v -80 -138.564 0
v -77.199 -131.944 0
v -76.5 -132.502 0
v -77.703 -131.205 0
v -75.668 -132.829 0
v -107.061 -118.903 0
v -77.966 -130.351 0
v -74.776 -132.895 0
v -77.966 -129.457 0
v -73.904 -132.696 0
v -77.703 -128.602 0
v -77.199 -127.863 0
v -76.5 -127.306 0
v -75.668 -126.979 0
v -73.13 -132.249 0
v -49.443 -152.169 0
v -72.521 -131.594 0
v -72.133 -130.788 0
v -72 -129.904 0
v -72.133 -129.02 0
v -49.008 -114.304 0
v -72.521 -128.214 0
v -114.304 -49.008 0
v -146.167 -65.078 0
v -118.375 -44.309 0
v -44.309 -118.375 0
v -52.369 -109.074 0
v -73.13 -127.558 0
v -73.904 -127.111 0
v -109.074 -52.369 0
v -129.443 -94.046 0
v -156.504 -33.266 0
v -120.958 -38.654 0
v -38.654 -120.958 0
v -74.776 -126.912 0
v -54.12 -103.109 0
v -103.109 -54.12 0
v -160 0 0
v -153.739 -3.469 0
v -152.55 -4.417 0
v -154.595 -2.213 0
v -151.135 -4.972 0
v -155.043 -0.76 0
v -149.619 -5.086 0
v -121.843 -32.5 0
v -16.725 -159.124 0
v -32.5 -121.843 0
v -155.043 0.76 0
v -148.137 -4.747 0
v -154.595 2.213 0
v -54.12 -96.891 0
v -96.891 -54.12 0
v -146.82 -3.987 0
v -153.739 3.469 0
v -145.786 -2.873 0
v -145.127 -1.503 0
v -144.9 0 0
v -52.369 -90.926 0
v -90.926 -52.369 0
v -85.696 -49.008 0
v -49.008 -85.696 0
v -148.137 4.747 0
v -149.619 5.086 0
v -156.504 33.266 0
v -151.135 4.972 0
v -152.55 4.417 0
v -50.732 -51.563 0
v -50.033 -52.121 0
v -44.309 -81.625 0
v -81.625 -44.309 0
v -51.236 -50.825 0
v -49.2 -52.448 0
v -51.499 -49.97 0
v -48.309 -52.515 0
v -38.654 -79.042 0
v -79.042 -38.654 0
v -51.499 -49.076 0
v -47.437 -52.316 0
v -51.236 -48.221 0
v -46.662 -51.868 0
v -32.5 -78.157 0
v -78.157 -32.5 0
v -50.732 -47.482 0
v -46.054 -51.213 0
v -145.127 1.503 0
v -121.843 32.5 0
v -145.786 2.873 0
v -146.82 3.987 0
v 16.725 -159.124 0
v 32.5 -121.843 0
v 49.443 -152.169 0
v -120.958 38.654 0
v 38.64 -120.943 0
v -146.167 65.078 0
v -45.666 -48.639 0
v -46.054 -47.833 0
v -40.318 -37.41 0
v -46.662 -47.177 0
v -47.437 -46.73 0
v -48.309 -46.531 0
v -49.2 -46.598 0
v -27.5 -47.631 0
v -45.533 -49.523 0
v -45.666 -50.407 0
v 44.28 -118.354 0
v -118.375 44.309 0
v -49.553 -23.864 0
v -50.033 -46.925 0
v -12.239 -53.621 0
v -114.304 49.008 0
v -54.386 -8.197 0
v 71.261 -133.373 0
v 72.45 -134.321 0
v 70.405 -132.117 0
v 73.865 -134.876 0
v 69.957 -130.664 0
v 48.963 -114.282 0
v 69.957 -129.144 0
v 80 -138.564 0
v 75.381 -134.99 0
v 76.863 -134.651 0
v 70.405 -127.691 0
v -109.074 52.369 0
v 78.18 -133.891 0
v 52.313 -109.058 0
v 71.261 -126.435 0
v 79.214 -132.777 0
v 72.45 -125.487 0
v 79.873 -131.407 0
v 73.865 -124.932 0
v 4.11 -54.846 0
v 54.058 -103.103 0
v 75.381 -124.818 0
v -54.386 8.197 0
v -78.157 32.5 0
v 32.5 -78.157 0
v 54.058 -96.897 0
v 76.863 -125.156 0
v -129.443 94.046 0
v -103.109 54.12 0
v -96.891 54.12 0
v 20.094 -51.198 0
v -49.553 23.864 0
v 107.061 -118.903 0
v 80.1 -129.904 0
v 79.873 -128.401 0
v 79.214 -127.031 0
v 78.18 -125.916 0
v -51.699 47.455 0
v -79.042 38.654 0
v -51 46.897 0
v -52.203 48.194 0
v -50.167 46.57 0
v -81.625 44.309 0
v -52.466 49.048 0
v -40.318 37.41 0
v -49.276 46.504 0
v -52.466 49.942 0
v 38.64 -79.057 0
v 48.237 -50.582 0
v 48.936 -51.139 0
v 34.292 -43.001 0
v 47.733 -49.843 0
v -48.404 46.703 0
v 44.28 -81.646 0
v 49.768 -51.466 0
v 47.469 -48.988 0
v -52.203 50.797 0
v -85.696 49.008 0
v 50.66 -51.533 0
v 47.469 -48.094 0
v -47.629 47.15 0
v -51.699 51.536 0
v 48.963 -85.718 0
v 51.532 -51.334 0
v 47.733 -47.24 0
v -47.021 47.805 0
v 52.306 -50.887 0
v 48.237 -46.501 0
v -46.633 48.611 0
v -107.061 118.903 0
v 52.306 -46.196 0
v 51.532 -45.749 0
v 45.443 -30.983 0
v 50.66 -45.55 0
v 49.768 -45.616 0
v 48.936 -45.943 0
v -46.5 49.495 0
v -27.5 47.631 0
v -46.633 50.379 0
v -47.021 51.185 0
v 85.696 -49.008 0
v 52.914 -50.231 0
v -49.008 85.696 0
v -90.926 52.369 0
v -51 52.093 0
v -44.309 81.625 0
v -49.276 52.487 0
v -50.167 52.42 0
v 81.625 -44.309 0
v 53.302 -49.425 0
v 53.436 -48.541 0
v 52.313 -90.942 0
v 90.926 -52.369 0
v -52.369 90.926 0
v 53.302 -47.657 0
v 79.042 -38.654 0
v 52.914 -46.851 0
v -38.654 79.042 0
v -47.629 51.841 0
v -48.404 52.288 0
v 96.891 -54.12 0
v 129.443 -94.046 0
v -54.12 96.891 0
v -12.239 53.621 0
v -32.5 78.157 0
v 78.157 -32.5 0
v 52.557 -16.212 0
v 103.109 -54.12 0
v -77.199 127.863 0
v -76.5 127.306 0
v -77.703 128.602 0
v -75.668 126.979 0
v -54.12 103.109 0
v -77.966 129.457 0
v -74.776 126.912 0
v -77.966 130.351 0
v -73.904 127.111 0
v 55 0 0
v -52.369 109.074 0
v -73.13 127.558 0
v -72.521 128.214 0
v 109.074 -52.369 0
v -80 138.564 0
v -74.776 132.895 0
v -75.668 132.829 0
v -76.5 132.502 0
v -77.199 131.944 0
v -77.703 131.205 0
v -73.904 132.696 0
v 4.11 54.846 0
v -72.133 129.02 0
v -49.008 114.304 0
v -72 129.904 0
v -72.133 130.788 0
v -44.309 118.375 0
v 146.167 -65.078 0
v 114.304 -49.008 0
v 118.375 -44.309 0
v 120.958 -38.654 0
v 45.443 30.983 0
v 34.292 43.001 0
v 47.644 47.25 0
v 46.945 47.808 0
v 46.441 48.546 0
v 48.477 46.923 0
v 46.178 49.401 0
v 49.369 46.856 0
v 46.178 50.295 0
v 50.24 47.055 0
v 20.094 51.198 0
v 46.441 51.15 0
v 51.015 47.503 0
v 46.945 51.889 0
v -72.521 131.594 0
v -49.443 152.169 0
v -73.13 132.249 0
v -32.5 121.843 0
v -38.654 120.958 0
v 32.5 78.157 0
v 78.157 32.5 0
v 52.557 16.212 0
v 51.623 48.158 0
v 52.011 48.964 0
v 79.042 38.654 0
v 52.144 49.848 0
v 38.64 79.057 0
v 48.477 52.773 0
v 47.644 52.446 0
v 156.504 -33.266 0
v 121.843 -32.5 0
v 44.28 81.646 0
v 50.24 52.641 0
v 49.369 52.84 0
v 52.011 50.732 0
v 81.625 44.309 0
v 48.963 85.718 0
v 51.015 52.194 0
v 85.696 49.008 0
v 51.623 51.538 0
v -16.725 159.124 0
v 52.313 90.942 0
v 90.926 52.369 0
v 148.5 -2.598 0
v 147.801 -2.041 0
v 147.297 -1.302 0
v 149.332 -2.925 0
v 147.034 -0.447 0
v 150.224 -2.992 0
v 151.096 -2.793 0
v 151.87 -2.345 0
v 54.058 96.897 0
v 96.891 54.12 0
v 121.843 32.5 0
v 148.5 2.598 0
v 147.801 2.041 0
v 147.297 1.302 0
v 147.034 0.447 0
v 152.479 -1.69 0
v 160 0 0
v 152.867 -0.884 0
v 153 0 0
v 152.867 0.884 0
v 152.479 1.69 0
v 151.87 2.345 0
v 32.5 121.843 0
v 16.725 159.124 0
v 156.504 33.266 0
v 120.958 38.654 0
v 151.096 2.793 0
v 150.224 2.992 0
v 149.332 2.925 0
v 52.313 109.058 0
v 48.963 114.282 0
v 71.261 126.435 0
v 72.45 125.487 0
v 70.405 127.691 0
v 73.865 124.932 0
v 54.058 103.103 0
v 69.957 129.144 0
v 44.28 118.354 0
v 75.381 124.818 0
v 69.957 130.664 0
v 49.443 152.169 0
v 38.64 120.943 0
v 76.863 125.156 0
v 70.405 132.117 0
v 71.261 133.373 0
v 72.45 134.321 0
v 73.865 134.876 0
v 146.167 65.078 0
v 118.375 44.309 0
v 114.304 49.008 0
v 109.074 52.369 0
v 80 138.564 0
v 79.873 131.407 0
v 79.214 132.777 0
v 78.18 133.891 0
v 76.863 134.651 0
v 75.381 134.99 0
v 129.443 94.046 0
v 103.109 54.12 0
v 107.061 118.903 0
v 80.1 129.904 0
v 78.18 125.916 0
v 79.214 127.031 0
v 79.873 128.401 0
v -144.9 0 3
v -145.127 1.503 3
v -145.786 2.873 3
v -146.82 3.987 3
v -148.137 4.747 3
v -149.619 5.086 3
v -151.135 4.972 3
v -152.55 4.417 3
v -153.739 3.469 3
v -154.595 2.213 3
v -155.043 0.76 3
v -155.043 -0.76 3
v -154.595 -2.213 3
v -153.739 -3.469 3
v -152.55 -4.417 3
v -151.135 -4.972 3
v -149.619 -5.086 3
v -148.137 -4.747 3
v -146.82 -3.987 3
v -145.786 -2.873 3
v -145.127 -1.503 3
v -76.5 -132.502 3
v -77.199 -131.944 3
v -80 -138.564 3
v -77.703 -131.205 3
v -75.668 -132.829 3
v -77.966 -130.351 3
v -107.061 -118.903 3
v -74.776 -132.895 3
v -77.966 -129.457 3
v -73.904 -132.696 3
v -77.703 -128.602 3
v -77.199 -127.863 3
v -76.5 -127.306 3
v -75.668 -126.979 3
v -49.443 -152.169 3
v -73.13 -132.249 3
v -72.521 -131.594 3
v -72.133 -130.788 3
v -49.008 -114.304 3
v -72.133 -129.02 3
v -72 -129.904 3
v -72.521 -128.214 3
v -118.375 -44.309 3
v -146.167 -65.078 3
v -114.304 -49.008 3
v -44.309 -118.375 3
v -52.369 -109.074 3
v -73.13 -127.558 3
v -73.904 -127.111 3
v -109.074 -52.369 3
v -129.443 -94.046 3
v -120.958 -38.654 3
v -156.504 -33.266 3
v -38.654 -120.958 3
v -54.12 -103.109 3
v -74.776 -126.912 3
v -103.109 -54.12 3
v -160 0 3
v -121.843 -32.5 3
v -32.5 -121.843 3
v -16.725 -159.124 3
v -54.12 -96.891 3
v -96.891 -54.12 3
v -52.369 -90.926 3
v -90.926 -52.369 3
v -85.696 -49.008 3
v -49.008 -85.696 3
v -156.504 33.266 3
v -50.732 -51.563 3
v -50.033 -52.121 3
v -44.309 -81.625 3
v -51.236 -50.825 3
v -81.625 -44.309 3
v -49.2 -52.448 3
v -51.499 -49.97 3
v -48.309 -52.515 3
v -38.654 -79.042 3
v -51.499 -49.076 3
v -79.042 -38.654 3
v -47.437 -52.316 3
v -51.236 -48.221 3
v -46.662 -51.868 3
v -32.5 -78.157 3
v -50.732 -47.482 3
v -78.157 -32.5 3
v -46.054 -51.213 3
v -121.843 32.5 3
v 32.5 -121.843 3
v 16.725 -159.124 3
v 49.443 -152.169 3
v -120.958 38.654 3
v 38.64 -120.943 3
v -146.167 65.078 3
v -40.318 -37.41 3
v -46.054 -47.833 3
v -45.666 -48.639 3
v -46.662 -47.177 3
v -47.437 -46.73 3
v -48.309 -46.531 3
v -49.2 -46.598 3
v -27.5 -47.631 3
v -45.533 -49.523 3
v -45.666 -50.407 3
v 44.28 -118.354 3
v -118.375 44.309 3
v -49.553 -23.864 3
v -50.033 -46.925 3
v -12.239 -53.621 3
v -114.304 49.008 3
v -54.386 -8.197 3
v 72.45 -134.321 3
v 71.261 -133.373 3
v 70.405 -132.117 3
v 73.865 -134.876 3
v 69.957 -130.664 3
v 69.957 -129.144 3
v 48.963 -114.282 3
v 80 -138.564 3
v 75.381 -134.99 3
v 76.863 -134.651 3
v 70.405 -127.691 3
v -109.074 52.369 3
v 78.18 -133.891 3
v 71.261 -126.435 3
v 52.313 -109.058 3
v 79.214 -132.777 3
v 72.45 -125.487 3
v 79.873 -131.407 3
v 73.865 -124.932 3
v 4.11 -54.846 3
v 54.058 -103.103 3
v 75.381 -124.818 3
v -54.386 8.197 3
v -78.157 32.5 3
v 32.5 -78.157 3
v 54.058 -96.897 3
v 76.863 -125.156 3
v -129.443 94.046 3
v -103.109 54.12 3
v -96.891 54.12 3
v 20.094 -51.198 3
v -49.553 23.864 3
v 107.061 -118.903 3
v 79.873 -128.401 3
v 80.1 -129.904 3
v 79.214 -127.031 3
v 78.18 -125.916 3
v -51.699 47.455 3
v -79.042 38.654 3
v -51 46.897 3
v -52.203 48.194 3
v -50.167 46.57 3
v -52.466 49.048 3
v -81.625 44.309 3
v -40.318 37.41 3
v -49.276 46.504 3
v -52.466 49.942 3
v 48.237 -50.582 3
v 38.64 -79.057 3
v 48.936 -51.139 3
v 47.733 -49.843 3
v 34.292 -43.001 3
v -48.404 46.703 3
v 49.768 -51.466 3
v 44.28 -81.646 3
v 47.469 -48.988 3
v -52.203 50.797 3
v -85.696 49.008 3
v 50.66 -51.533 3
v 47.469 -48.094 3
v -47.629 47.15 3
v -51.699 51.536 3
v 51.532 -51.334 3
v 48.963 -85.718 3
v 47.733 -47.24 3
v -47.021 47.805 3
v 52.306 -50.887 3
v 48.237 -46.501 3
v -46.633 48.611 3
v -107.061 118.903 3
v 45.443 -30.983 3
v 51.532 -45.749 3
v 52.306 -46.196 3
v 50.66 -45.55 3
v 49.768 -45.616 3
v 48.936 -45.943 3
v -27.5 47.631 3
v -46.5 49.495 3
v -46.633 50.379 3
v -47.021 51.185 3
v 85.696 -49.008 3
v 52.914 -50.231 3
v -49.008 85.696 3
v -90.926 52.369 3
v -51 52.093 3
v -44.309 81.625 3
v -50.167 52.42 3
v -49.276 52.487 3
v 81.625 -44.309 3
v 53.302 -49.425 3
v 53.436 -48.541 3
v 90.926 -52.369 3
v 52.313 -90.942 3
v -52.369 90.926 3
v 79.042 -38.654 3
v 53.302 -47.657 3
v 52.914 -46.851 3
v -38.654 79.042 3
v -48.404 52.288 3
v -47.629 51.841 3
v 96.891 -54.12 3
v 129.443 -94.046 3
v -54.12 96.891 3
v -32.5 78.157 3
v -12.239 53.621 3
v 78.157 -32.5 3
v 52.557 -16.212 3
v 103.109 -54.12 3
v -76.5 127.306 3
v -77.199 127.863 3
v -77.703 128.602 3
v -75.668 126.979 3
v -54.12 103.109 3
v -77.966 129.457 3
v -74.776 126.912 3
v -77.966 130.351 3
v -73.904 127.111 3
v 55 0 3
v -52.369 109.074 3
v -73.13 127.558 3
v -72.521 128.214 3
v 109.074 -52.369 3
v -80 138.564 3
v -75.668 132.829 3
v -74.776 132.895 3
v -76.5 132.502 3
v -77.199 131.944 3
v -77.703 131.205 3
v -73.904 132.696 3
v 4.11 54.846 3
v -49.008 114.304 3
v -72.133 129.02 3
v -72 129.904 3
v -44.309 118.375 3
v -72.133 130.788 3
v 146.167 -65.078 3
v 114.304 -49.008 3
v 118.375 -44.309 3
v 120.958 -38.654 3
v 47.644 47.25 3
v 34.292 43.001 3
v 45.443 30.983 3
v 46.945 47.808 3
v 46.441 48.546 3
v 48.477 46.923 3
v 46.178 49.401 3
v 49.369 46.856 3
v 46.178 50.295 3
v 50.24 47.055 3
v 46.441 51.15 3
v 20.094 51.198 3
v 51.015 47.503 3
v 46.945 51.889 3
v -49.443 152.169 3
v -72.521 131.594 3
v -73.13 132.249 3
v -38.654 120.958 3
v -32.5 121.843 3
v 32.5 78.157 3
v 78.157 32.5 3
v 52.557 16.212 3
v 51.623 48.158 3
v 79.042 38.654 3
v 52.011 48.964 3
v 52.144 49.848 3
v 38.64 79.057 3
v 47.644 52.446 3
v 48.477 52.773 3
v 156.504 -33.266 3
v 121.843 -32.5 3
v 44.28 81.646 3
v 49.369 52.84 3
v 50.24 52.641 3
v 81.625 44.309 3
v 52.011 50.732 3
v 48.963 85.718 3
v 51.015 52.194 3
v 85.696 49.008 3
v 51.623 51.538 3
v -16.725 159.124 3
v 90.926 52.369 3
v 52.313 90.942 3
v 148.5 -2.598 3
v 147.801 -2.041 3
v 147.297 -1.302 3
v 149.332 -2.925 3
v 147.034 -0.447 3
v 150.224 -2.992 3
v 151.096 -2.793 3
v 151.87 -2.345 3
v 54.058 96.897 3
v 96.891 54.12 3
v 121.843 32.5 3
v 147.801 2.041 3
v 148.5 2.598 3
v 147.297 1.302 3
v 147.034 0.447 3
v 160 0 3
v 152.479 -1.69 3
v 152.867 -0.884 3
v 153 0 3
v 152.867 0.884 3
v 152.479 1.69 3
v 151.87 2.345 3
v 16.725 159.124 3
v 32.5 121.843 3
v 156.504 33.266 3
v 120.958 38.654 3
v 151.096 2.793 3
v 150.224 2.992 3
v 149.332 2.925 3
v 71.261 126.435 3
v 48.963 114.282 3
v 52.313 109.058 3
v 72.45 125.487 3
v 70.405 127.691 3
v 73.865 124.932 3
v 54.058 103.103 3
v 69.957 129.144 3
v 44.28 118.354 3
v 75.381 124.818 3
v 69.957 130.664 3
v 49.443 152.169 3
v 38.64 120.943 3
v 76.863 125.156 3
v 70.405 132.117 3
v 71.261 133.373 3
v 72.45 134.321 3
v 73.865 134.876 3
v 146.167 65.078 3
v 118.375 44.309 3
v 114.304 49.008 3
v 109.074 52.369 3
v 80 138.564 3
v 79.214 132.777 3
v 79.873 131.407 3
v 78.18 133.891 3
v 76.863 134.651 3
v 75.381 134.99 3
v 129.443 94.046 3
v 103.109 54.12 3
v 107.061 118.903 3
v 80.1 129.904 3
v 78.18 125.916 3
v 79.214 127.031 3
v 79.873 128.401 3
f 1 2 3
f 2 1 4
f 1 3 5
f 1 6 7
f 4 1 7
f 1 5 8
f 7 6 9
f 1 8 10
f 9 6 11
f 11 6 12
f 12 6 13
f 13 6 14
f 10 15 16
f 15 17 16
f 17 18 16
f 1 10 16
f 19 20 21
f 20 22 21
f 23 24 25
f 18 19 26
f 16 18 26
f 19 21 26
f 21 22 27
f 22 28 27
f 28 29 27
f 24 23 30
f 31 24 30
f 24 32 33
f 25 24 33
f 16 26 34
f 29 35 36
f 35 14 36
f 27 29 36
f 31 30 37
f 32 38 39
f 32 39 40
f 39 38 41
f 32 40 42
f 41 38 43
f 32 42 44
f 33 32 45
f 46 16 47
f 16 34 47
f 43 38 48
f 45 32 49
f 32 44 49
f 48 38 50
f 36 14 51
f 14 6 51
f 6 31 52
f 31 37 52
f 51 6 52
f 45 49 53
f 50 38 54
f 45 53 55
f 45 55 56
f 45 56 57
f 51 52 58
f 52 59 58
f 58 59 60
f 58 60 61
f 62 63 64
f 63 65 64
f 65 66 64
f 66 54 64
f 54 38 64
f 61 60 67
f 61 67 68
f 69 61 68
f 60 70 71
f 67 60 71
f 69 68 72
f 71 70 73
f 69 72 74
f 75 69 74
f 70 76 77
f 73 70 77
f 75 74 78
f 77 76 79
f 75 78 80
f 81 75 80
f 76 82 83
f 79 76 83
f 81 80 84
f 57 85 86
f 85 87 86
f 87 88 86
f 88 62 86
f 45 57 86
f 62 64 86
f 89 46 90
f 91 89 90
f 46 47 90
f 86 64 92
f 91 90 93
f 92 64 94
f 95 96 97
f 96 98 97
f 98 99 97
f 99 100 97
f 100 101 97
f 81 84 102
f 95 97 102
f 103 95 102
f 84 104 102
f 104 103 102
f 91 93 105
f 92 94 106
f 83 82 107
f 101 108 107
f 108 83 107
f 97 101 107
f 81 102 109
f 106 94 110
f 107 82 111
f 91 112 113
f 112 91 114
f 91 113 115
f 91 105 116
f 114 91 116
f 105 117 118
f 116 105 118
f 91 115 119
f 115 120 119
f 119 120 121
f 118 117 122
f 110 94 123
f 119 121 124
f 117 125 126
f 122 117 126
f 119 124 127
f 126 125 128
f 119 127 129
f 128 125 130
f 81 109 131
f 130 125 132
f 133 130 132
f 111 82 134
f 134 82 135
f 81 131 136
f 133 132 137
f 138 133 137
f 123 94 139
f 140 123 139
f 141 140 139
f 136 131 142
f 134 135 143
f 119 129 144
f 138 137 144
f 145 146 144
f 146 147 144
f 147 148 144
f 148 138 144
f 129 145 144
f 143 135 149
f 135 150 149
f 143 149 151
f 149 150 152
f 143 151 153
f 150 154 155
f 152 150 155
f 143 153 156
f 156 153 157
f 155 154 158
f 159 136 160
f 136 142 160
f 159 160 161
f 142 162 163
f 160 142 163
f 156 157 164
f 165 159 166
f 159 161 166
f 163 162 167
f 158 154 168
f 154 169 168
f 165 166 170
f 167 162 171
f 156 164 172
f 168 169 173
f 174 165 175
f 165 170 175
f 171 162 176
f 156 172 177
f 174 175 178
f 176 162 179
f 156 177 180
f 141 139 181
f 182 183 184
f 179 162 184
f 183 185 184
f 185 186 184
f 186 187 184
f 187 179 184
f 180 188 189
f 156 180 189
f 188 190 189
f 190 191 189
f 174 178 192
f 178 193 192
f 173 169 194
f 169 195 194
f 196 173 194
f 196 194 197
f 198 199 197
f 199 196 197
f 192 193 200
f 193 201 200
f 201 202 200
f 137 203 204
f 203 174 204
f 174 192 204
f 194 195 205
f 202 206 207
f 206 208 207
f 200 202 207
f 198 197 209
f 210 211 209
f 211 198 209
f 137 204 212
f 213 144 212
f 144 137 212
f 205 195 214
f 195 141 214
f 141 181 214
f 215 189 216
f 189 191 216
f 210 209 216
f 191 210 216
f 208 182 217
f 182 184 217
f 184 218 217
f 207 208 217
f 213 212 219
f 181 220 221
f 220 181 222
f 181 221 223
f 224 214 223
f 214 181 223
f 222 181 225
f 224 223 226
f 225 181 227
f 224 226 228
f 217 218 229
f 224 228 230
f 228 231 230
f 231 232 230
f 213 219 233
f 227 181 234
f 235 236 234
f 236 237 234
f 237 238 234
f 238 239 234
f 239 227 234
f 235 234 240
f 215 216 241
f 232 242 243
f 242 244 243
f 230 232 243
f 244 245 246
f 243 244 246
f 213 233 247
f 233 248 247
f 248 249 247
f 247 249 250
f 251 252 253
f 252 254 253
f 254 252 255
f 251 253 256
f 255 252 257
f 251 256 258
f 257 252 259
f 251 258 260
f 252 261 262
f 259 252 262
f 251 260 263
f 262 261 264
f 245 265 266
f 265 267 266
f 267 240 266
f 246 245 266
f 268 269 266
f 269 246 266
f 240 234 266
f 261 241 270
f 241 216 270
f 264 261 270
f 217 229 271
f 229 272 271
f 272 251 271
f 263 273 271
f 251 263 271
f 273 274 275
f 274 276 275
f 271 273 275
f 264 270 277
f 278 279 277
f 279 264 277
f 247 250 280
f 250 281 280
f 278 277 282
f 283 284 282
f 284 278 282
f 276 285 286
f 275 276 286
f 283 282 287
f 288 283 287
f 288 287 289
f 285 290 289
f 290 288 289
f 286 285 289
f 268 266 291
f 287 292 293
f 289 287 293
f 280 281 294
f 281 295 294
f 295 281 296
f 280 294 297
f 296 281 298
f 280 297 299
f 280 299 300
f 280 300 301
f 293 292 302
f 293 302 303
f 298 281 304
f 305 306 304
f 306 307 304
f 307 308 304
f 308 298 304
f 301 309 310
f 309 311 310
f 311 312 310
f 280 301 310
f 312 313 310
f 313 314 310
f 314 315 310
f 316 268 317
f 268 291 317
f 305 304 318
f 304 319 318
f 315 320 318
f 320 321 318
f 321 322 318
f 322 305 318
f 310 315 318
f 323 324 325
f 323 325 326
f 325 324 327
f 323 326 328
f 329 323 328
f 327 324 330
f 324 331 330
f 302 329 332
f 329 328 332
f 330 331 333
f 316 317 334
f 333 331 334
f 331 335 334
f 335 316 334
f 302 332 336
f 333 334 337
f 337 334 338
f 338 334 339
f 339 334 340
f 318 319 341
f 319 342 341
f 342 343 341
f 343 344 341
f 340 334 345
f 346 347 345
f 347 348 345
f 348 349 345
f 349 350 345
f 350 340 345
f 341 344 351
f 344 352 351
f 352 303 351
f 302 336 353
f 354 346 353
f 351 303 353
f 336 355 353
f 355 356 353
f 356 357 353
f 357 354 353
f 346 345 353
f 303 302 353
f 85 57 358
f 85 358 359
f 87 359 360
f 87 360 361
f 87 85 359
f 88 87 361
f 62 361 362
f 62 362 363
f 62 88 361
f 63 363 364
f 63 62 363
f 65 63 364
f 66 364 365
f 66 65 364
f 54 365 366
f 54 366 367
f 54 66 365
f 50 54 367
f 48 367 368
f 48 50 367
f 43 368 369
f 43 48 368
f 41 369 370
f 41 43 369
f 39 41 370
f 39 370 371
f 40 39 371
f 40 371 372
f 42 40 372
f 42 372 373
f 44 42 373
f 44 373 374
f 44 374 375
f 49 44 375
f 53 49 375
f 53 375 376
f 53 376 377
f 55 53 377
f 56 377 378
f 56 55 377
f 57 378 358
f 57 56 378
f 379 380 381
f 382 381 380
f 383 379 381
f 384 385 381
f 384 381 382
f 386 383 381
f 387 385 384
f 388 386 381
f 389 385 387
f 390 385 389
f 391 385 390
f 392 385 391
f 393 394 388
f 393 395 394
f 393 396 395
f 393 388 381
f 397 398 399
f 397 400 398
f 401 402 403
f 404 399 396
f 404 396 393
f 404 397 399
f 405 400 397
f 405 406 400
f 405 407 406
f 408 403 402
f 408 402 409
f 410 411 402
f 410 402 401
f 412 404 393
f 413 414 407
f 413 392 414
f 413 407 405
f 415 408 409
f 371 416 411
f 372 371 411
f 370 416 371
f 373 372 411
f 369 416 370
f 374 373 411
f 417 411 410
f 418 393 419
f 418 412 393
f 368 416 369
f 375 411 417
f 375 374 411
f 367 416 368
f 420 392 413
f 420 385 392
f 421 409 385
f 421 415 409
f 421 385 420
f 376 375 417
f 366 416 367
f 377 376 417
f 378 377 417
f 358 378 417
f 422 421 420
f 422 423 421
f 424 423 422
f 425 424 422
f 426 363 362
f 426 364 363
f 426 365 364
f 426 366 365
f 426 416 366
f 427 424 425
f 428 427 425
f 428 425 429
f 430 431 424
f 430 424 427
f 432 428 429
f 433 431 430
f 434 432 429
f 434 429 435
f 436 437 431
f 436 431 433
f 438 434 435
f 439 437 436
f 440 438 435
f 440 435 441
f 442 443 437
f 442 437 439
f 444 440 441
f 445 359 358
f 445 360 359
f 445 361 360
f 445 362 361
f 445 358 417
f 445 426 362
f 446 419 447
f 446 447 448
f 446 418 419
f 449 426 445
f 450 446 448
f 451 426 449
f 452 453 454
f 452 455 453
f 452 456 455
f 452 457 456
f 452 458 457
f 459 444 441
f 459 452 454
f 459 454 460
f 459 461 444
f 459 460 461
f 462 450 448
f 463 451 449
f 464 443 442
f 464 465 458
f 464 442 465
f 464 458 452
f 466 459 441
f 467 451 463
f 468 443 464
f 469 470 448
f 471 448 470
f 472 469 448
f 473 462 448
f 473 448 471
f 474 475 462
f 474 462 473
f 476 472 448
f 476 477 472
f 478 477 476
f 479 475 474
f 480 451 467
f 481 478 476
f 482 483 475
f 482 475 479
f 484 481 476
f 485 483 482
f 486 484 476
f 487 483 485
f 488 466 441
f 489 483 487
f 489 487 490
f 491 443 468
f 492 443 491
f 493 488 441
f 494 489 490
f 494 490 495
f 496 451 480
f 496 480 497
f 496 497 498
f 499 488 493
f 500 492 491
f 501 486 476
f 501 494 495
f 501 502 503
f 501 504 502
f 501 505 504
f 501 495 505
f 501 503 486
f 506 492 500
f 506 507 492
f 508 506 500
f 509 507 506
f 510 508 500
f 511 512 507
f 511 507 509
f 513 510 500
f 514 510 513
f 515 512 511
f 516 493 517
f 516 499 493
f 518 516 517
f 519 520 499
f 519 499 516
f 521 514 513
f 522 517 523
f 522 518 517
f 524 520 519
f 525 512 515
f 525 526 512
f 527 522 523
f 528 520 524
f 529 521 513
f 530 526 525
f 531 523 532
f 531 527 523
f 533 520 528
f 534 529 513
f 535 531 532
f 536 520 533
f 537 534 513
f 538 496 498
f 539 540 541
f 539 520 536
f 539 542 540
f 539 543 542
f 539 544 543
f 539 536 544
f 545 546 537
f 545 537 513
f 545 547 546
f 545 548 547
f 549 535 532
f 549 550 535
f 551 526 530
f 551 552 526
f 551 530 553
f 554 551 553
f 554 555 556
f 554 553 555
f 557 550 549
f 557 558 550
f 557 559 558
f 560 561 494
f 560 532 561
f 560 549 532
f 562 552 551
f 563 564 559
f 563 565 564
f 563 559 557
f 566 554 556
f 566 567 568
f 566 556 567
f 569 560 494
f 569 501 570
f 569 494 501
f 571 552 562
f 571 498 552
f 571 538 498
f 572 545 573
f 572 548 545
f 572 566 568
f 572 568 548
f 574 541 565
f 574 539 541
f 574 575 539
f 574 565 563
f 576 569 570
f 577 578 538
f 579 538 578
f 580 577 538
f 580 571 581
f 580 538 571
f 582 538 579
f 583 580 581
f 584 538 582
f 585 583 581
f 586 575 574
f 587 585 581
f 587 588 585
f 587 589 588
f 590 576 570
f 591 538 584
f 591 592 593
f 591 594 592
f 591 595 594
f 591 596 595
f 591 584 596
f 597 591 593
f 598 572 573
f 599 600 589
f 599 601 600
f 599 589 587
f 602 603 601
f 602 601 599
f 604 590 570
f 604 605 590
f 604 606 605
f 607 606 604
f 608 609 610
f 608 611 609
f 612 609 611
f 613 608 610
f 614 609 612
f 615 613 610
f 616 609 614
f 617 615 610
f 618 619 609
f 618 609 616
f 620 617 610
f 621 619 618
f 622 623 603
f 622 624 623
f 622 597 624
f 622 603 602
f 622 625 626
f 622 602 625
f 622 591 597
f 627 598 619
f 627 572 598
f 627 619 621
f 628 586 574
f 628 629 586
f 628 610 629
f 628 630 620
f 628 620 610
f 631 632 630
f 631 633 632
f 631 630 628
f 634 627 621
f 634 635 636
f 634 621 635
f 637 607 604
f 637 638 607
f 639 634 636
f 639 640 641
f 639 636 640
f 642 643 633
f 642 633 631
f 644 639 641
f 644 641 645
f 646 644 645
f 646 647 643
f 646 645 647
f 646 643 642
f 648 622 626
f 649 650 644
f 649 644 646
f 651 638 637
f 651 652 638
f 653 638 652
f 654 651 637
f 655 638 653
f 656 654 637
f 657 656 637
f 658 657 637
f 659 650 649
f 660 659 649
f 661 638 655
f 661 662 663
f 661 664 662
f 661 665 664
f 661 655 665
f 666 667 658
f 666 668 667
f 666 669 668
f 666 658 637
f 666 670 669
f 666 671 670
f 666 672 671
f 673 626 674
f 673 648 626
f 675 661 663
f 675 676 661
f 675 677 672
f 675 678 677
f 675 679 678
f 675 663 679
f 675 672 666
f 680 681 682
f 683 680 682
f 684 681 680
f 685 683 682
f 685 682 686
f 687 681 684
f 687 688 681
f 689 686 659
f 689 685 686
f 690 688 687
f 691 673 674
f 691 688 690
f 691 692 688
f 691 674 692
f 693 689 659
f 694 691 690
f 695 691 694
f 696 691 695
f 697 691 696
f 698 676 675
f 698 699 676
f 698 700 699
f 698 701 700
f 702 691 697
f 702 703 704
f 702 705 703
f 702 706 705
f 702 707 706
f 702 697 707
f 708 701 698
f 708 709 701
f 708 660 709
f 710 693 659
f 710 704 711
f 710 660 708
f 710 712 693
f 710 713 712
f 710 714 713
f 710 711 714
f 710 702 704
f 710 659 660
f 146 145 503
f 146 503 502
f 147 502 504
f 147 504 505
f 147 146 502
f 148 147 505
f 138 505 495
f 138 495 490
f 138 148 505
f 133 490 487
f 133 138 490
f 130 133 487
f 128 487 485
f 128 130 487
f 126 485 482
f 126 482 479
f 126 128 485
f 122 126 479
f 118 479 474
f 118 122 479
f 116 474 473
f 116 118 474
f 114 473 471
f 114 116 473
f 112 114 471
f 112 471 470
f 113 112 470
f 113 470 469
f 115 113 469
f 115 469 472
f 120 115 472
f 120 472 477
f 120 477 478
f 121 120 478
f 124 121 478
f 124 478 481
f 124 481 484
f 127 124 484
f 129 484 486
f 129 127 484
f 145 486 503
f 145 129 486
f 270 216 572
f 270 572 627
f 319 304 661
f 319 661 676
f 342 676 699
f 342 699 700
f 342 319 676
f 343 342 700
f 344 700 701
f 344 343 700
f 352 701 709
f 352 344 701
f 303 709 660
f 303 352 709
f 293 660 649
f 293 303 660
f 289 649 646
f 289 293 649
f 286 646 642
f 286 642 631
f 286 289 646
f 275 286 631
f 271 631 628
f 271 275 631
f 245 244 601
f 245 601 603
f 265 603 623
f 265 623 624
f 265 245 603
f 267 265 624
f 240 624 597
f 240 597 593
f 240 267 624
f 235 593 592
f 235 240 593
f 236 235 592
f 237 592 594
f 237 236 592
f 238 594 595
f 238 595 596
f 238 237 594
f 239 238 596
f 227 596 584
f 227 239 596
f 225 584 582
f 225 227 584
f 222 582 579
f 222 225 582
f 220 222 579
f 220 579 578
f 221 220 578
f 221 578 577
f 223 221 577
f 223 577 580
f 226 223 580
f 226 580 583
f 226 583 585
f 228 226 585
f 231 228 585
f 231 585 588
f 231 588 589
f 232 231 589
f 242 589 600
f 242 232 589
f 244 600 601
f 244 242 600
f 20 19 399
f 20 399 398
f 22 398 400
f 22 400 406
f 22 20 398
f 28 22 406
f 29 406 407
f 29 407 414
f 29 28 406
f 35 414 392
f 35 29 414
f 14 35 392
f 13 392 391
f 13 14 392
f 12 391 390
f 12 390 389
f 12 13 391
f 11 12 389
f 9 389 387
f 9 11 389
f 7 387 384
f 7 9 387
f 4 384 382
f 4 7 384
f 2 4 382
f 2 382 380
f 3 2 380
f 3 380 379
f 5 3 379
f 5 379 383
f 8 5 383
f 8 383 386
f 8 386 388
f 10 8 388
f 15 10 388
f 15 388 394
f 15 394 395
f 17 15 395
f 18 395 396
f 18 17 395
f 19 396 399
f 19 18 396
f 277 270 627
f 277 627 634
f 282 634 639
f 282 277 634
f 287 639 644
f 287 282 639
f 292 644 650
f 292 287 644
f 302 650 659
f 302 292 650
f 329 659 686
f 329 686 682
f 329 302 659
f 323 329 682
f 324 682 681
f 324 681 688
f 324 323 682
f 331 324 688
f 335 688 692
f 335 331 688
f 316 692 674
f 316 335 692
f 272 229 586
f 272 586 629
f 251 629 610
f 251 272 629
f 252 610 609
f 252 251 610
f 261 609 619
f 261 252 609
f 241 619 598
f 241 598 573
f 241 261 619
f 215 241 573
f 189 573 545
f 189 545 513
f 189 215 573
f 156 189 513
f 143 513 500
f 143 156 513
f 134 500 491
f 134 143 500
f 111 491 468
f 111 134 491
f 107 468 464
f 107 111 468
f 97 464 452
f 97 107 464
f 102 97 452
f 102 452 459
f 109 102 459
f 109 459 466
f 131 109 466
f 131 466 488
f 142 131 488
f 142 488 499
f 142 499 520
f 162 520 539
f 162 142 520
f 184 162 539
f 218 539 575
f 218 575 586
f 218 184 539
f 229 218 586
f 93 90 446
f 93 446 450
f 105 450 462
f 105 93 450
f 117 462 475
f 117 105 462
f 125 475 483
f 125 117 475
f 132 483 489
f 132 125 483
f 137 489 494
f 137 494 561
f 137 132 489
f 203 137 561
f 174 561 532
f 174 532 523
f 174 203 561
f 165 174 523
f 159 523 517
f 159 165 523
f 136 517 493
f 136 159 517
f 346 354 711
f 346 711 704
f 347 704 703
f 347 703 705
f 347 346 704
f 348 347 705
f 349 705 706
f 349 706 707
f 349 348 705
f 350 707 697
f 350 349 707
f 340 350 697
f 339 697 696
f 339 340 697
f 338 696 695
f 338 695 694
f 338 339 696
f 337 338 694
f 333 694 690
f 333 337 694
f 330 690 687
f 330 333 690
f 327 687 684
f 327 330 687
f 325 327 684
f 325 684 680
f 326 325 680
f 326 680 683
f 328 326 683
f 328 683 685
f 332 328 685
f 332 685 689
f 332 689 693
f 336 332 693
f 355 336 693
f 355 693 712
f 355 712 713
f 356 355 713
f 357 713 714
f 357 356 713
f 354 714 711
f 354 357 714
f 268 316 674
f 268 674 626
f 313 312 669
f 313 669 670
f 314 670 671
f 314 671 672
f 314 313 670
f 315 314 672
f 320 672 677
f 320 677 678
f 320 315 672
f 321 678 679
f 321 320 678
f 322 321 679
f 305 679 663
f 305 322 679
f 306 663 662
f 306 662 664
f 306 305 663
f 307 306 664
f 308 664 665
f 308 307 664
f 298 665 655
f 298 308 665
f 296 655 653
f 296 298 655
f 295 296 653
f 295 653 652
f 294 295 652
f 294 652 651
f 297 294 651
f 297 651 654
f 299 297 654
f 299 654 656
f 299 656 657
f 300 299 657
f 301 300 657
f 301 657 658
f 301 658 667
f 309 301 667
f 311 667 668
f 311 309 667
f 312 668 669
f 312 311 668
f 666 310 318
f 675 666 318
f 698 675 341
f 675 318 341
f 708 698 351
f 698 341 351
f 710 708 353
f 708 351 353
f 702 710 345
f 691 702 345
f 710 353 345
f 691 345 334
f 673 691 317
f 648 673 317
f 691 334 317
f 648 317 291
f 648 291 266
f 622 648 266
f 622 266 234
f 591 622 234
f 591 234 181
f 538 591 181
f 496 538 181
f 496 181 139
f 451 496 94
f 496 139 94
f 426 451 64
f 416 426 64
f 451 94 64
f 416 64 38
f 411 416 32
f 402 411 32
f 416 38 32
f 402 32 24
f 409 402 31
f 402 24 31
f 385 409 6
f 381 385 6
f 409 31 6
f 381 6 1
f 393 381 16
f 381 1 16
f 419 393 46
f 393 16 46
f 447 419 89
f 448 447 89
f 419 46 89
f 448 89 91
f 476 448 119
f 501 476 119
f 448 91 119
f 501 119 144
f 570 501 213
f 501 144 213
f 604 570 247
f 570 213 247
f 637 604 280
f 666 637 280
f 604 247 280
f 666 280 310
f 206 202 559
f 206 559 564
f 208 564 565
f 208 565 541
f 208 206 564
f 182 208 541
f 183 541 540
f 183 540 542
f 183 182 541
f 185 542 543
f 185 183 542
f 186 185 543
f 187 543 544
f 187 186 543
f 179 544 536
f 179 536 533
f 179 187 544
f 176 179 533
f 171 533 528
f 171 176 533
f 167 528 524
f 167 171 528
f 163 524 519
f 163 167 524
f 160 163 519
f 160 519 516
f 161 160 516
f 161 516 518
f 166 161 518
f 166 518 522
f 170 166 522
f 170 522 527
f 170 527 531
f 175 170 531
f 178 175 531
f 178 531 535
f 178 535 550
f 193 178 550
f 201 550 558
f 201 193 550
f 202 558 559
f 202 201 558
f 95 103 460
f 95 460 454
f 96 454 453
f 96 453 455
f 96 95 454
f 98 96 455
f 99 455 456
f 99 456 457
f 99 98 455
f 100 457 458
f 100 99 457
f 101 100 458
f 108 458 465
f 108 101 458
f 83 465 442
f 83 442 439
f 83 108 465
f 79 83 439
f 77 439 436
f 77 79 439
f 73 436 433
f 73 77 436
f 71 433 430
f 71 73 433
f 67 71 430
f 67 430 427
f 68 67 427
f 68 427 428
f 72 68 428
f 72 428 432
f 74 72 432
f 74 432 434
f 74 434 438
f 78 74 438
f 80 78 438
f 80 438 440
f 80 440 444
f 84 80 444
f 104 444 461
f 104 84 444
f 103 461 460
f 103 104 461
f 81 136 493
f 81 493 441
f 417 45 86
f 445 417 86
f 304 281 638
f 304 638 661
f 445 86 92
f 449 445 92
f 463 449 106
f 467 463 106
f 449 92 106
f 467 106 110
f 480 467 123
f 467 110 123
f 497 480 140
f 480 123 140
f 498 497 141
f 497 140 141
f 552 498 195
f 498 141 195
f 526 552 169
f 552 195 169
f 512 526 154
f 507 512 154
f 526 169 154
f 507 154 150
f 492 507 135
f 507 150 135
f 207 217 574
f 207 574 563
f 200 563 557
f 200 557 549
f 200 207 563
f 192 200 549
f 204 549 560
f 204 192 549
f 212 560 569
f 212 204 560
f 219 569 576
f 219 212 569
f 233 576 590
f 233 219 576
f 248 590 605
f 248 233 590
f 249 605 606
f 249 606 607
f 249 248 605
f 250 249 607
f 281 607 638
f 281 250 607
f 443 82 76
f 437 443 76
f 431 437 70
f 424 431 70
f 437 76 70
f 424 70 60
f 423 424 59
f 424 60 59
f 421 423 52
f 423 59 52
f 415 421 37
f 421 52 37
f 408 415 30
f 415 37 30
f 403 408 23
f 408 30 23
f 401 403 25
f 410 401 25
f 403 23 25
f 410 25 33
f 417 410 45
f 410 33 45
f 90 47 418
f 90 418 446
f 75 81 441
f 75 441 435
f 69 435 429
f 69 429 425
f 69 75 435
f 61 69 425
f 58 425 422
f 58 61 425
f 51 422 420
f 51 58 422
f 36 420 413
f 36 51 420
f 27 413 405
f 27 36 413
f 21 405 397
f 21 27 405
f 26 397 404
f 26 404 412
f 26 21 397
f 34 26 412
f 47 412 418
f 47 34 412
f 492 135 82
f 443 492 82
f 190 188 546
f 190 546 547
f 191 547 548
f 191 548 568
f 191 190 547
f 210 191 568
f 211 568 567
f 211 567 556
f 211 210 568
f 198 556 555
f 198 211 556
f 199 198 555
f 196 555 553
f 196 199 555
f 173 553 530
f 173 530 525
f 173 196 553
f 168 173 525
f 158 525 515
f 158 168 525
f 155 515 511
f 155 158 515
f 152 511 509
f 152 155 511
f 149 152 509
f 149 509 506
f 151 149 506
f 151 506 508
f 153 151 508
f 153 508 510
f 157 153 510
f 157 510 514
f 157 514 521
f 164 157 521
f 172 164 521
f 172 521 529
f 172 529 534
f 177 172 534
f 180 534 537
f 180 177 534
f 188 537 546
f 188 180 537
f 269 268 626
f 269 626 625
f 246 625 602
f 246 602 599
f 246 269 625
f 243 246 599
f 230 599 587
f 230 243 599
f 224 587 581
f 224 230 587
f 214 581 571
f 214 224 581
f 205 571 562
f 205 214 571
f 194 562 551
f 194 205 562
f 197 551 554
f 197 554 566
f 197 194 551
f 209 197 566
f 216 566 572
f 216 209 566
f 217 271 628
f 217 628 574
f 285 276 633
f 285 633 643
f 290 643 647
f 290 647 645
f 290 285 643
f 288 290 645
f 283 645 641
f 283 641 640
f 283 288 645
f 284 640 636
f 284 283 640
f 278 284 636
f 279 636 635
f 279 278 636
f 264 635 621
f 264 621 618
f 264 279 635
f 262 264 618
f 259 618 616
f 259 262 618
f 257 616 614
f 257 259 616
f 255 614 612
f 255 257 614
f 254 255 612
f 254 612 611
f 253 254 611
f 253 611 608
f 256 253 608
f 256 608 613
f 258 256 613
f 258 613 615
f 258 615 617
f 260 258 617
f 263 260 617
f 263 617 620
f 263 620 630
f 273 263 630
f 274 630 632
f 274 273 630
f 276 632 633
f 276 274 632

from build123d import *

# Parameters (mm, degrees)
CROQUIS1_R              = 160
CROQUIS1_R_2            = 55
CROQUIS1_R_3            = 5.1
CROQUIS1_R_4            = 3
SALIENTE_EXTRUIR2_DEPTH = 3


with BuildPart() as part:
    # Croquis1 → Saliente-Extruir2 (new body)
    with BuildSketch(Plane.XY):
        Circle(CROQUIS1_R)
        Circle(CROQUIS1_R_2, mode=Mode.SUBTRACT)
        with Locations((-150, 0)):
            Circle(CROQUIS1_R_3, mode=Mode.SUBTRACT)
        with Locations((-48.532730183, -49.522943911)):
            Circle(CROQUIS1_R_4, mode=Mode.SUBTRACT)
        with Locations((75, 129.903810568)):
            Circle(CROQUIS1_R_3, mode=Mode.SUBTRACT)
        with Locations((75, -129.903810568)):
            Circle(CROQUIS1_R_3, mode=Mode.SUBTRACT)
        with Locations((-75, 129.903810568)):
            Circle(CROQUIS1_R_4, mode=Mode.SUBTRACT)
        with Locations((150, 0)):
            Circle(CROQUIS1_R_4, mode=Mode.SUBTRACT)
        with Locations((-75, -129.903810568)):
            Circle(CROQUIS1_R_4, mode=Mode.SUBTRACT)
        with Locations((-49.499768998, 49.495180262)):
            Circle(CROQUIS1_R_4, mode=Mode.SUBTRACT)
        with Locations((50.43565577, -48.541164253)):
            Circle(CROQUIS1_R_4, mode=Mode.SUBTRACT)
        with Locations((49.144383708, 49.848064656)):
            Circle(CROQUIS1_R_4, mode=Mode.SUBTRACT)
        with BuildLine():
            Line((-32.5, 78.157247055), (32.5, 78.157247055))
            ThreePointArc((32.5, 78.157247055), (54.279441944, 100), (32.5, 121.842752945))
            Line((32.5, 121.842752945), (-32.5, 121.842752945))
            ThreePointArc((-32.5, 121.842752945), (-54.342752945, 100), (-32.5, 78.157247055))
        make_face(mode=Mode.SUBTRACT)
        with BuildLine():
            Line((-32.5, -121.842752945), (32.5, -121.842752945))
            ThreePointArc((32.5, -121.842752945), (54.279441944, -100), (32.5, -78.157247055))
            Line((32.5, -78.157247055), (-32.5, -78.157247055))
            ThreePointArc((-32.5, -78.157247055), (-54.342752945, -100), (-32.5, -121.842752945))
        make_face(mode=Mode.SUBTRACT)
        with BuildLine():
            Line((78.157247055, 32.5), (78.157247055, -32.5))
            ThreePointArc((78.157247055, -32.5), (100, -54.342752945), (121.842752945, -32.5))
            Line((121.842752945, -32.5), (121.842752945, 32.5))
            ThreePointArc((121.842752945, 32.5), (100, 54.342752945), (78.157247055, 32.5))
        make_face(mode=Mode.SUBTRACT)
        with BuildLine():
            Line((-78.157247055, 32.5), (-78.157247055, -32.5))
            ThreePointArc((-78.157247055, -32.5), (-100, -54.342752945), (-121.842752945, -32.5))
            Line((-121.842752945, -32.5), (-121.842752945, 32.5))
            ThreePointArc((-121.842752945, 32.5), (-100, 54.342752945), (-78.157247055, 32.5))
        make_face(mode=Mode.SUBTRACT)
    extrude(amount=SALIENTE_EXTRUIR2_DEPTH)


solid = part.part
